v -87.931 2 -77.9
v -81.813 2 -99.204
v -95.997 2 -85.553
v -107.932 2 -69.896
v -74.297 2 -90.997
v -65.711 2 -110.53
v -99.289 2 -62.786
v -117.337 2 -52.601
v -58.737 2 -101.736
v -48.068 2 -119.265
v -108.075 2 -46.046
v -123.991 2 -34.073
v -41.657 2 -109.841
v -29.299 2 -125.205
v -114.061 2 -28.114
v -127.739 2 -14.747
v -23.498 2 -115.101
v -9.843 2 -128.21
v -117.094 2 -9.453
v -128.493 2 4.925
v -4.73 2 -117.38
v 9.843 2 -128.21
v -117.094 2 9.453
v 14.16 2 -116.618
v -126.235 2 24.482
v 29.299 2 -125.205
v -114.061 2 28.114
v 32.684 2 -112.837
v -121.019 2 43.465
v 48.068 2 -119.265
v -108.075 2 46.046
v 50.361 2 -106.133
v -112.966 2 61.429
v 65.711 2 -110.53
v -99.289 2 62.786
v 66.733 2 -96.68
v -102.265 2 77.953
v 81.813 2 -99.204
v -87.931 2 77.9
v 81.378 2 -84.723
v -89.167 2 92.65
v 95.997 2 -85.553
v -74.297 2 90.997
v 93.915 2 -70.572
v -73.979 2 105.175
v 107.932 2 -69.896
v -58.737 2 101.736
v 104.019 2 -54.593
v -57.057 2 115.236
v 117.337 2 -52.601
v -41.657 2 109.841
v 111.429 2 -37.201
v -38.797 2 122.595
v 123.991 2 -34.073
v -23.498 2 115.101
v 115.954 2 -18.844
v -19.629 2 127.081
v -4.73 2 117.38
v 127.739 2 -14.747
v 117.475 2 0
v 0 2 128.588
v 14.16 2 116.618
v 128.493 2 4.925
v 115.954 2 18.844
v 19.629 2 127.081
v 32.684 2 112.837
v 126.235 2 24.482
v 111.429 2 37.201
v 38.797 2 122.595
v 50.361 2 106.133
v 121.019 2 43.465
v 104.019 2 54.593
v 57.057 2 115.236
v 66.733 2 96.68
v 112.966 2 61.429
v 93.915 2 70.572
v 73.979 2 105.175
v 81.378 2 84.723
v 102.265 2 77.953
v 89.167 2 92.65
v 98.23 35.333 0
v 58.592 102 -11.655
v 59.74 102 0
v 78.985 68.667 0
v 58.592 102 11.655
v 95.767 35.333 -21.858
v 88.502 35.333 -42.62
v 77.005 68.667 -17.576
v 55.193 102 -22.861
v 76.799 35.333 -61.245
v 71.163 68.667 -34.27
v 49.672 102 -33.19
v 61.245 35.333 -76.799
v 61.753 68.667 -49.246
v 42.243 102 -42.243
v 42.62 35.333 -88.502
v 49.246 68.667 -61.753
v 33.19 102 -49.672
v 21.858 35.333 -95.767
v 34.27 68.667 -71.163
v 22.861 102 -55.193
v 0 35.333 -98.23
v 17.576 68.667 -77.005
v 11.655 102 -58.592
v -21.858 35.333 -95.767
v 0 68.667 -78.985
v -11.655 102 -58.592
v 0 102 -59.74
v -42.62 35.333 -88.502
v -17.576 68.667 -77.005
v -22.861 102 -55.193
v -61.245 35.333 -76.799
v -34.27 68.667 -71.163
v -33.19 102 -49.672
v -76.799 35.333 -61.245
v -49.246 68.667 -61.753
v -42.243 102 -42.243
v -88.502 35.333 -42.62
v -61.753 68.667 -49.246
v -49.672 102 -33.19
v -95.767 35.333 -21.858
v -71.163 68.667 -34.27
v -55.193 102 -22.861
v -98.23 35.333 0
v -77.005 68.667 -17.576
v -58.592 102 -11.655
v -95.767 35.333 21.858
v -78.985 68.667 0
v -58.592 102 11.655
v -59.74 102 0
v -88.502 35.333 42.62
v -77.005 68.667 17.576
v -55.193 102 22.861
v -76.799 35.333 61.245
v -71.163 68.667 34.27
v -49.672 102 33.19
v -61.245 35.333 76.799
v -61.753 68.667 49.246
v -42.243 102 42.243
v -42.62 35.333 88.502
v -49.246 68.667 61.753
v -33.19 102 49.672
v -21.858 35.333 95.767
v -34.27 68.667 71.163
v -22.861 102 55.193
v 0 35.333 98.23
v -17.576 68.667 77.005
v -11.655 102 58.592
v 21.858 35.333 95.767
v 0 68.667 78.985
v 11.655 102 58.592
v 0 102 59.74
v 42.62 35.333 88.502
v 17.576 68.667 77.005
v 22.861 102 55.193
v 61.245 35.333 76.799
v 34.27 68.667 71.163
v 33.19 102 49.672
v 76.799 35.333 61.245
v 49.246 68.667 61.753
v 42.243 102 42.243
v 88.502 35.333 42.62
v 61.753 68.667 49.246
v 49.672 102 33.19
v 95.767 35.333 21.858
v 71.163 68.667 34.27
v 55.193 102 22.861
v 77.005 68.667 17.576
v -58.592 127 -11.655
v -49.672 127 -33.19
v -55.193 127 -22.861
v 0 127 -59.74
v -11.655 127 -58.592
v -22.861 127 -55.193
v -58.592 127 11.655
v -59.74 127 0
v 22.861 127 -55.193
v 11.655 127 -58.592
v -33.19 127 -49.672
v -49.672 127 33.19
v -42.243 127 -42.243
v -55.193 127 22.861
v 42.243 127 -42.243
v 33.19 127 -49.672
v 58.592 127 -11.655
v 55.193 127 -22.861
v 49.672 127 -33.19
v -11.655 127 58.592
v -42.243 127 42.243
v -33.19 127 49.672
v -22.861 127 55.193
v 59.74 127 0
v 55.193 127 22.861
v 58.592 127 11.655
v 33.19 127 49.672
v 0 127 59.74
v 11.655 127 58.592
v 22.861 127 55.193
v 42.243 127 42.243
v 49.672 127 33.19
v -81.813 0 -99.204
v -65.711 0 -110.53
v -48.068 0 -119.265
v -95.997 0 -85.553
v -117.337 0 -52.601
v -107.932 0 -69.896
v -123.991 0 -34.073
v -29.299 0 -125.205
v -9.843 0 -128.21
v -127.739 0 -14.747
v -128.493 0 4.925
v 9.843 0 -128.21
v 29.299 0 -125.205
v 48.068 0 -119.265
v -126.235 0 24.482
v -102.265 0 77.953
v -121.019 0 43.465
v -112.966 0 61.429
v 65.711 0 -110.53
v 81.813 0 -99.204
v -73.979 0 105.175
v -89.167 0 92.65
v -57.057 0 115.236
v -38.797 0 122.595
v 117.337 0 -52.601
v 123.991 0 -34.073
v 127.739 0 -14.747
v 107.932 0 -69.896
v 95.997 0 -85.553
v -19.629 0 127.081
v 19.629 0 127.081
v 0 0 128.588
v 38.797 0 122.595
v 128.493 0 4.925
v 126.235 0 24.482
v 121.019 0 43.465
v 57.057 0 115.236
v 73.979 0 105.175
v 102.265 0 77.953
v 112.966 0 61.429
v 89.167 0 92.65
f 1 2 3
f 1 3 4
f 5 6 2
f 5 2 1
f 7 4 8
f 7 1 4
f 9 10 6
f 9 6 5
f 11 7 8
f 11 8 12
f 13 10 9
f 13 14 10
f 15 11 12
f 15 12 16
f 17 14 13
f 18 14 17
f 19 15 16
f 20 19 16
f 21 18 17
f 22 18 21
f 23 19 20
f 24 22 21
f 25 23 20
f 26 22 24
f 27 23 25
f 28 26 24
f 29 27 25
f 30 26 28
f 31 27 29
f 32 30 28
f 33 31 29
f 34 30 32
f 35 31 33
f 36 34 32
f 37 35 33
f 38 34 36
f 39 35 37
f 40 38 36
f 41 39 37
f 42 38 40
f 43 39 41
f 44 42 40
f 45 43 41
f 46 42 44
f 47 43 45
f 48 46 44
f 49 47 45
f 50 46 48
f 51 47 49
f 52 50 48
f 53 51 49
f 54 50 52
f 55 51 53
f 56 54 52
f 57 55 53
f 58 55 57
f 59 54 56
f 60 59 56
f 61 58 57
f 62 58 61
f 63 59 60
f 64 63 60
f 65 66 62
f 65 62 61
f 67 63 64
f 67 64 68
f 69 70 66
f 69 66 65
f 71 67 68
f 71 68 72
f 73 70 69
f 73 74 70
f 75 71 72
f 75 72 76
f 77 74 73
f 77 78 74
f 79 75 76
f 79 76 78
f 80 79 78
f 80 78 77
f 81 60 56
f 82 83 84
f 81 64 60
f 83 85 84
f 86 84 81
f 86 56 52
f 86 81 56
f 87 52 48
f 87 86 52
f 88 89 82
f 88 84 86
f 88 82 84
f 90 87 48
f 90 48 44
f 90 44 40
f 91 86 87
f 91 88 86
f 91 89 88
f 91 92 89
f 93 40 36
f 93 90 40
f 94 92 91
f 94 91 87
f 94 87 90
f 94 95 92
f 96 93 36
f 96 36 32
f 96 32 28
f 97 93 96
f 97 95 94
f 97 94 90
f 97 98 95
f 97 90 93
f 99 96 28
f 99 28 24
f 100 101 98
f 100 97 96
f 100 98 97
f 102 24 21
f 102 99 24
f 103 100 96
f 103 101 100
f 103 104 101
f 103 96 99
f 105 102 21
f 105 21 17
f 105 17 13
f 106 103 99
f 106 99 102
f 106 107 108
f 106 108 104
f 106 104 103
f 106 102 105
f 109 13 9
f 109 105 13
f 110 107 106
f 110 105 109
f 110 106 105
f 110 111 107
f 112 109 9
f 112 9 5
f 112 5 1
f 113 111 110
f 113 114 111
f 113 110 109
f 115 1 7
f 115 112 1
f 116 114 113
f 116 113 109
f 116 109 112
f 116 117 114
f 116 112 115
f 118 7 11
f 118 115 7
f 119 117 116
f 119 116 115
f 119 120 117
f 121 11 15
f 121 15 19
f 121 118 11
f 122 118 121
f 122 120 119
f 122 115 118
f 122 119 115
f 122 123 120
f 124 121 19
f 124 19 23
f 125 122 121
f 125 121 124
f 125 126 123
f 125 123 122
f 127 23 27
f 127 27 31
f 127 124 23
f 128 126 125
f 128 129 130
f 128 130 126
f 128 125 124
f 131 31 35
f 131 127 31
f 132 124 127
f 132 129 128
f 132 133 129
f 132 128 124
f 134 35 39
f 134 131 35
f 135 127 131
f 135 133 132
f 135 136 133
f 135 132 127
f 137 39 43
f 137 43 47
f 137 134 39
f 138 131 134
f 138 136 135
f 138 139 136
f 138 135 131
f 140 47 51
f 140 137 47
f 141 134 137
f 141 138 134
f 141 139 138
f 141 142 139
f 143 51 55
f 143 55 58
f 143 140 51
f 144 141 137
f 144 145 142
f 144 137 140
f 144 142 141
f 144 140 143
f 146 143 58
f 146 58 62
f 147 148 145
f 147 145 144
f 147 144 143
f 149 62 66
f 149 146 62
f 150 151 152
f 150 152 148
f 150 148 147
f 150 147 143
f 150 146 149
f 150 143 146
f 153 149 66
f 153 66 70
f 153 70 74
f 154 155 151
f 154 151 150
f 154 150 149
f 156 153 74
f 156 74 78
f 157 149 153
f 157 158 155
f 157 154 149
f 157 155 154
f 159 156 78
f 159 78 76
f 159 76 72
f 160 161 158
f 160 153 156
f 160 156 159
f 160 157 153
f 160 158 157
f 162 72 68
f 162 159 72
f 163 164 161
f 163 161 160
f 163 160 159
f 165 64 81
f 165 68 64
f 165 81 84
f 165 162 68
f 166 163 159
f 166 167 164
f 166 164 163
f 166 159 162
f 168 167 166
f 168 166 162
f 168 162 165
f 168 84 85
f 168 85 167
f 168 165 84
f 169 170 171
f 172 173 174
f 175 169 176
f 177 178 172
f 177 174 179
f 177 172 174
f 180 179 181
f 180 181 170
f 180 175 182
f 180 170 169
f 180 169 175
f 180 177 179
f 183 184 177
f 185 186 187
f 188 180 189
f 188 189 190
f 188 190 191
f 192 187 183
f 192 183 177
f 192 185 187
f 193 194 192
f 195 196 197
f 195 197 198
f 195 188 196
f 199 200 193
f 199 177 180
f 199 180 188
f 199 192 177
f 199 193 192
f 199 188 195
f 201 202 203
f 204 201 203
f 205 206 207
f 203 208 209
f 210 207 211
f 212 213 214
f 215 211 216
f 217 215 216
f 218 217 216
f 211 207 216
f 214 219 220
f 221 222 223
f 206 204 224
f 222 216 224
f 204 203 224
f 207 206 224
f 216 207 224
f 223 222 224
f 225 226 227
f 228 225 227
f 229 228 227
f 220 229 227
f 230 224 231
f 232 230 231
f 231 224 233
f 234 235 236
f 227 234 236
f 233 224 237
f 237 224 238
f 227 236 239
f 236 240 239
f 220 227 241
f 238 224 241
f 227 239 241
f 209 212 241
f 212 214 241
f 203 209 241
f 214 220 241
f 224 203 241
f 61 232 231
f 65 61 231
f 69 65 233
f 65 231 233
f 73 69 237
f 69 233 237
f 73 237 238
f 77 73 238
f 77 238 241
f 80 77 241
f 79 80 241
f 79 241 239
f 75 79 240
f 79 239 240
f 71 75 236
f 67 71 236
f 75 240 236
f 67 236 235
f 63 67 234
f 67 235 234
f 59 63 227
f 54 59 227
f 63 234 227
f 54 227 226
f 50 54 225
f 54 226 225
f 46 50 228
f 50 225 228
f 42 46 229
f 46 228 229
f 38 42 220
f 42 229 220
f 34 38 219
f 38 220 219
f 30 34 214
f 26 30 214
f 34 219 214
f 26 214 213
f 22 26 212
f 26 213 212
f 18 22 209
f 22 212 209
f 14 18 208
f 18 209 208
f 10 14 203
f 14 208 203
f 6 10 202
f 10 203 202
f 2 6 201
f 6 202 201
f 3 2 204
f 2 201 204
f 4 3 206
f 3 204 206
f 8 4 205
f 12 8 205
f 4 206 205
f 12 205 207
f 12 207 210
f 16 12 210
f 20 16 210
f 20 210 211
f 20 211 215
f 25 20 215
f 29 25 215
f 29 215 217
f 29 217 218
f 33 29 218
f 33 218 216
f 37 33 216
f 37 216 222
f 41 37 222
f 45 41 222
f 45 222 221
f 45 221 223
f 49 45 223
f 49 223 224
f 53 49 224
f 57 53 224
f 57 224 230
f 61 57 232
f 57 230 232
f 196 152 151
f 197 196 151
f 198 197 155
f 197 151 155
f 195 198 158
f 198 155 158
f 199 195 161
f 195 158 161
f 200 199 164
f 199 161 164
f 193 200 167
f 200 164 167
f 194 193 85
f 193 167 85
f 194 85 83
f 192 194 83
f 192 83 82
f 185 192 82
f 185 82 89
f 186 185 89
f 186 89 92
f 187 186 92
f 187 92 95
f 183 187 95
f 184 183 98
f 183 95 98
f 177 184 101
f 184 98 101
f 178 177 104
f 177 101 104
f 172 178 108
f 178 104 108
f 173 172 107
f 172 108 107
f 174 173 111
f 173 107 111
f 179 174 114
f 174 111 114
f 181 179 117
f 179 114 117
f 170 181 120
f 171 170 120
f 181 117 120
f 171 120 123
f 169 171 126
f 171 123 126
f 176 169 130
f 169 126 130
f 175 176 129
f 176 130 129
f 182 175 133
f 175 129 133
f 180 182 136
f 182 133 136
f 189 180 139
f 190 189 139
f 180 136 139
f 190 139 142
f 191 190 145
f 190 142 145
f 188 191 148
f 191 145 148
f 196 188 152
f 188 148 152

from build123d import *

# Parameters (mm, degrees)
SKETCH1_R           = 128.5875
BOSS_EXTRUDE1_DEPTH = 2
SKETCH2_R           = 117.475
BOSS_EXTRUDE2_DEPTH = 100
BOSS_EXTRUDE2_TAPER = 30
SKETCH6_R           = 59.739973081
BOSS_EXTRUDE3_DEPTH = 25


with BuildPart() as part:
    # Sketch1 → Boss-Extrude1 (new body)
    with BuildSketch(Plane(origin=(0, 0, 0), x_dir=(1, 0, 0), z_dir=(0, 1, 0))):
        with Locations(Location((0, 0, 0), (0, 0, 270))):
            Circle(SKETCH1_R)
    extrude(amount=BOSS_EXTRUDE1_DEPTH)

    # Sketch2 → Boss-Extrude2 (add)
    with BuildSketch(Plane(origin=(0, 2, 0), x_dir=(1, 0, 0), z_dir=(0, 1, 0))):
        Circle(SKETCH2_R)
    extrude(amount=BOSS_EXTRUDE2_DEPTH, taper=BOSS_EXTRUDE2_TAPER)

    # Sketch6 → Boss-Extrude3 (add)
    with BuildSketch(Plane(origin=(0, 102, 0), x_dir=(1, 0, 0), z_dir=(0, 1, 0))):
        with Locations(Location((0, 0, 0), (0, 0, 270))):
            Circle(SKETCH6_R)
    extrude(amount=BOSS_EXTRUDE3_DEPTH)


solid = part.part
